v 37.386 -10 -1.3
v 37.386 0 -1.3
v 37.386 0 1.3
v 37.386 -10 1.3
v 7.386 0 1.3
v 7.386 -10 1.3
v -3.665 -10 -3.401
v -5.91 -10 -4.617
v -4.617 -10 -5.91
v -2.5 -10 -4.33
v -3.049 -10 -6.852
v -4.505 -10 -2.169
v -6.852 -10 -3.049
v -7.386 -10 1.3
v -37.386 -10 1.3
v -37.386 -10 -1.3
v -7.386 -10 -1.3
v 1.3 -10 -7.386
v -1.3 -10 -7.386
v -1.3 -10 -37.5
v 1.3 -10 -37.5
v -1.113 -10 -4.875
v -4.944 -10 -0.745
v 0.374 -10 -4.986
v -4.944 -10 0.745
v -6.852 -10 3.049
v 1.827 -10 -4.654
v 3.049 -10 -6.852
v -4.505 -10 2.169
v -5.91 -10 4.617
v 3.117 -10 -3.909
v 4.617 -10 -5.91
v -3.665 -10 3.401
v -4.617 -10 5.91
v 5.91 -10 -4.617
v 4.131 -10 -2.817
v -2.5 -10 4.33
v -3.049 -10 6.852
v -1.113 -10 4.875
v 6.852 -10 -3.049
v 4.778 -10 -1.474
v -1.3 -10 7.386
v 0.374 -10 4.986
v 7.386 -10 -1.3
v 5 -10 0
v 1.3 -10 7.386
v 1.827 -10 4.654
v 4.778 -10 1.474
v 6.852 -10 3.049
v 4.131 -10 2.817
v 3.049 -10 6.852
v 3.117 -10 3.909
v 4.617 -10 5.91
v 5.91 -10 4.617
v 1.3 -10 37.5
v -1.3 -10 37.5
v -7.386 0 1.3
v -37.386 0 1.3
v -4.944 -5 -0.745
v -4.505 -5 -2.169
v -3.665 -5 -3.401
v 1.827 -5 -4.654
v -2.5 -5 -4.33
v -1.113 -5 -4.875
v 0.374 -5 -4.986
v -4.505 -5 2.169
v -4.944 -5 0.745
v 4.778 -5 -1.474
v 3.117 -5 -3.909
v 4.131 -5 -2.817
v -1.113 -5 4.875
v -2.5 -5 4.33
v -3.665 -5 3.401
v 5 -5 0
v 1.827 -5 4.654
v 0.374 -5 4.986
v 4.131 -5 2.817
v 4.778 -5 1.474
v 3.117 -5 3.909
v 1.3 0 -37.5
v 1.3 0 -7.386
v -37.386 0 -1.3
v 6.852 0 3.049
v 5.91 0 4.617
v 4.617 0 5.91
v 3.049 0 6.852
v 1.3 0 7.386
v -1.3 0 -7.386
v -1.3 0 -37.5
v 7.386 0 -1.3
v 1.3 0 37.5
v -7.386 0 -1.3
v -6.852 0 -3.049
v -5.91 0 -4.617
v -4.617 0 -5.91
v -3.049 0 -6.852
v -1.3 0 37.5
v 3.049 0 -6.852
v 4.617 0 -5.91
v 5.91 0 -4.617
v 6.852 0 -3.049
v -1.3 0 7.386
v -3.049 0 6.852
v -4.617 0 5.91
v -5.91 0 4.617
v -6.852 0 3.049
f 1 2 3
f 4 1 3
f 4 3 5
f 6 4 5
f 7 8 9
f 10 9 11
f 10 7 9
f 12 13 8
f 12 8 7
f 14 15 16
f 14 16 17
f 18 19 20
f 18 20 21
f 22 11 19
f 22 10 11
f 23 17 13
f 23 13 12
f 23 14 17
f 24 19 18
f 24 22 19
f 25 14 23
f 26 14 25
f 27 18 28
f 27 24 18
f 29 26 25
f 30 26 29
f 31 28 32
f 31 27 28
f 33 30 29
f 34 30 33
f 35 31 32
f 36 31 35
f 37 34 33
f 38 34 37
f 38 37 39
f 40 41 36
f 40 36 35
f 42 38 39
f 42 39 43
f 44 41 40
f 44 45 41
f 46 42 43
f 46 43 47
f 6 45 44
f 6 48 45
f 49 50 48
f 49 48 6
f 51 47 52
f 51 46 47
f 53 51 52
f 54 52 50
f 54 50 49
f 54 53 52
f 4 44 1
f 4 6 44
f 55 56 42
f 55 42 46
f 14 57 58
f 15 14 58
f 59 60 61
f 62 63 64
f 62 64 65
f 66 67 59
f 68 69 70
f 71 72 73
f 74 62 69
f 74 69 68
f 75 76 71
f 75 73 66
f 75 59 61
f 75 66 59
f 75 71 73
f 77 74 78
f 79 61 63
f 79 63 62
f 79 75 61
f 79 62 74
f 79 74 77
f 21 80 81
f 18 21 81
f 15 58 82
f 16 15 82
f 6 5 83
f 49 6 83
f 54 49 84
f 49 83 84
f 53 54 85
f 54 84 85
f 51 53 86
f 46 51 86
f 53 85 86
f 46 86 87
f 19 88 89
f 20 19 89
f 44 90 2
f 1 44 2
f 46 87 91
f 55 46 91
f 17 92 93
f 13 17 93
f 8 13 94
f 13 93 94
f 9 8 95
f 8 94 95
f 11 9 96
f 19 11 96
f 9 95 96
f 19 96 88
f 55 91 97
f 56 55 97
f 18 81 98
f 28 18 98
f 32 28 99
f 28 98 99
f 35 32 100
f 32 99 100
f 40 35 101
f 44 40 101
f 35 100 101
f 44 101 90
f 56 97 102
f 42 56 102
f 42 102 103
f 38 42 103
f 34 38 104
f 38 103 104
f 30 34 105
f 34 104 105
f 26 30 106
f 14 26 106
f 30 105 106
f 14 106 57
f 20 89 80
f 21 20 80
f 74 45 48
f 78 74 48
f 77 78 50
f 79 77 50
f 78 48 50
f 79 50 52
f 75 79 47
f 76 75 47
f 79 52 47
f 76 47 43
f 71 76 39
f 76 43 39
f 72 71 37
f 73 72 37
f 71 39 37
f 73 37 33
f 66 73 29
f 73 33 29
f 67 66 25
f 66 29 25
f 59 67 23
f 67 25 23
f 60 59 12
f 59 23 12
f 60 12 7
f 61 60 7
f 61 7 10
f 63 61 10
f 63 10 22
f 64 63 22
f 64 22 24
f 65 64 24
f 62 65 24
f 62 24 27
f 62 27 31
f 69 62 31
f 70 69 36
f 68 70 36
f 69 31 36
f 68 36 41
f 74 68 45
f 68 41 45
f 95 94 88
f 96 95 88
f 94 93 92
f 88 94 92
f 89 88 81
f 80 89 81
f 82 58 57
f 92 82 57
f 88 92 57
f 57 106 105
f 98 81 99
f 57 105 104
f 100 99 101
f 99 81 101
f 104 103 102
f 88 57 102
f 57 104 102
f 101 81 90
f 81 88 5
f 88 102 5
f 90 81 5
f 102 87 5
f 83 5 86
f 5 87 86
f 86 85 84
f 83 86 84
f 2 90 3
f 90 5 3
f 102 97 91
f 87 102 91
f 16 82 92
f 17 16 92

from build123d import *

# Parameters (mm, degrees)
F1_DEPTH = 10
F2_R     = 5
F3_DEPTH = 5


with BuildPart() as f1:
    # F0 (on Front) → F1 (new body)
    with BuildSketch(Plane.XZ):
        with BuildLine():
            ThreePointArc((7.386474, -1.3), (7.471565, -0.652474), (7.5, 0))
            ThreePointArc((7.5, 0), (7.471565, 0.652474), (7.386474, 1.3))
            ThreePointArc((7.386474, 1.3), (5.303301, 5.303301), (1.3, 7.386474))
            ThreePointArc((1.3, 7.386474), (0, 7.5), (-1.3, 7.386474))
            ThreePointArc((-1.3, 7.386474), (-5.303301, 5.303301), (-7.386474, 1.3))
            ThreePointArc((-7.386474, 1.3), (-7.5, 0), (-7.386474, -1.3))
            ThreePointArc((-7.386474, -1.3), (-5.303301, -5.303301), (-1.3, -7.386474))
            ThreePointArc((-1.3, -7.386474), (0, -7.5), (1.3, -7.386474))
            ThreePointArc((1.3, -7.386474), (5.303301, -5.303301), (7.386474, -1.3))
        make_face()
        with BuildLine():
            ThreePointArc((7.386474, 1.3), (7.471565, 0.652474), (7.5, 0))
            ThreePointArc((7.5, 0), (7.471565, -0.652474), (7.386474, -1.3))
            Line((7.386474, -1.3), (37.386474, -1.3))
            Line((37.386474, -1.3), (37.386474, 0))
            Line((37.386474, 0), (37.386474, 1.3))
            Line((37.386474, 1.3), (7.386474, 1.3))
        make_face()
        with BuildLine():
            ThreePointArc((-1.3, 7.386474), (0, 7.5), (1.3, 7.386474))
            Line((1.3, 7.386474), (1.3, 37.5))
            Line((1.3, 37.5), (0, 37.5))
            Line((0, 37.5), (-1.3, 37.5))
            Line((-1.3, 37.5), (-1.3, 7.386474))
        make_face()
        with BuildLine():
            Line((1.3, -37.5), (1.3, -7.386474))
            ThreePointArc((1.3, -7.386474), (0, -7.5), (-1.3, -7.386474))
            Line((-1.3, -7.386474), (-1.3, -37.5))
            Line((-1.3, -37.5), (0, -37.5))
            Line((0, -37.5), (1.3, -37.5))
        make_face()
        with BuildLine():
            ThreePointArc((-7.386474, -1.3), (-7.5, 0), (-7.386474, 1.3))
            Line((-7.386474, 1.3), (-37.386474, 1.3))
            Line((-37.386474, 1.3), (-37.386474, 0))
            Line((-37.386474, 0), (-37.386474, -1.3))
            Line((-37.386474, -1.3), (-7.386474, -1.3))
        make_face()
    extrude(amount=F1_DEPTH)

    # F2 (on face) → F3 (cut)
    with BuildSketch(Plane.XZ.offset(10)):
        Circle(F2_R)
    extrude(amount=-F3_DEPTH, mode=Mode.SUBTRACT)


solid = f1.part
